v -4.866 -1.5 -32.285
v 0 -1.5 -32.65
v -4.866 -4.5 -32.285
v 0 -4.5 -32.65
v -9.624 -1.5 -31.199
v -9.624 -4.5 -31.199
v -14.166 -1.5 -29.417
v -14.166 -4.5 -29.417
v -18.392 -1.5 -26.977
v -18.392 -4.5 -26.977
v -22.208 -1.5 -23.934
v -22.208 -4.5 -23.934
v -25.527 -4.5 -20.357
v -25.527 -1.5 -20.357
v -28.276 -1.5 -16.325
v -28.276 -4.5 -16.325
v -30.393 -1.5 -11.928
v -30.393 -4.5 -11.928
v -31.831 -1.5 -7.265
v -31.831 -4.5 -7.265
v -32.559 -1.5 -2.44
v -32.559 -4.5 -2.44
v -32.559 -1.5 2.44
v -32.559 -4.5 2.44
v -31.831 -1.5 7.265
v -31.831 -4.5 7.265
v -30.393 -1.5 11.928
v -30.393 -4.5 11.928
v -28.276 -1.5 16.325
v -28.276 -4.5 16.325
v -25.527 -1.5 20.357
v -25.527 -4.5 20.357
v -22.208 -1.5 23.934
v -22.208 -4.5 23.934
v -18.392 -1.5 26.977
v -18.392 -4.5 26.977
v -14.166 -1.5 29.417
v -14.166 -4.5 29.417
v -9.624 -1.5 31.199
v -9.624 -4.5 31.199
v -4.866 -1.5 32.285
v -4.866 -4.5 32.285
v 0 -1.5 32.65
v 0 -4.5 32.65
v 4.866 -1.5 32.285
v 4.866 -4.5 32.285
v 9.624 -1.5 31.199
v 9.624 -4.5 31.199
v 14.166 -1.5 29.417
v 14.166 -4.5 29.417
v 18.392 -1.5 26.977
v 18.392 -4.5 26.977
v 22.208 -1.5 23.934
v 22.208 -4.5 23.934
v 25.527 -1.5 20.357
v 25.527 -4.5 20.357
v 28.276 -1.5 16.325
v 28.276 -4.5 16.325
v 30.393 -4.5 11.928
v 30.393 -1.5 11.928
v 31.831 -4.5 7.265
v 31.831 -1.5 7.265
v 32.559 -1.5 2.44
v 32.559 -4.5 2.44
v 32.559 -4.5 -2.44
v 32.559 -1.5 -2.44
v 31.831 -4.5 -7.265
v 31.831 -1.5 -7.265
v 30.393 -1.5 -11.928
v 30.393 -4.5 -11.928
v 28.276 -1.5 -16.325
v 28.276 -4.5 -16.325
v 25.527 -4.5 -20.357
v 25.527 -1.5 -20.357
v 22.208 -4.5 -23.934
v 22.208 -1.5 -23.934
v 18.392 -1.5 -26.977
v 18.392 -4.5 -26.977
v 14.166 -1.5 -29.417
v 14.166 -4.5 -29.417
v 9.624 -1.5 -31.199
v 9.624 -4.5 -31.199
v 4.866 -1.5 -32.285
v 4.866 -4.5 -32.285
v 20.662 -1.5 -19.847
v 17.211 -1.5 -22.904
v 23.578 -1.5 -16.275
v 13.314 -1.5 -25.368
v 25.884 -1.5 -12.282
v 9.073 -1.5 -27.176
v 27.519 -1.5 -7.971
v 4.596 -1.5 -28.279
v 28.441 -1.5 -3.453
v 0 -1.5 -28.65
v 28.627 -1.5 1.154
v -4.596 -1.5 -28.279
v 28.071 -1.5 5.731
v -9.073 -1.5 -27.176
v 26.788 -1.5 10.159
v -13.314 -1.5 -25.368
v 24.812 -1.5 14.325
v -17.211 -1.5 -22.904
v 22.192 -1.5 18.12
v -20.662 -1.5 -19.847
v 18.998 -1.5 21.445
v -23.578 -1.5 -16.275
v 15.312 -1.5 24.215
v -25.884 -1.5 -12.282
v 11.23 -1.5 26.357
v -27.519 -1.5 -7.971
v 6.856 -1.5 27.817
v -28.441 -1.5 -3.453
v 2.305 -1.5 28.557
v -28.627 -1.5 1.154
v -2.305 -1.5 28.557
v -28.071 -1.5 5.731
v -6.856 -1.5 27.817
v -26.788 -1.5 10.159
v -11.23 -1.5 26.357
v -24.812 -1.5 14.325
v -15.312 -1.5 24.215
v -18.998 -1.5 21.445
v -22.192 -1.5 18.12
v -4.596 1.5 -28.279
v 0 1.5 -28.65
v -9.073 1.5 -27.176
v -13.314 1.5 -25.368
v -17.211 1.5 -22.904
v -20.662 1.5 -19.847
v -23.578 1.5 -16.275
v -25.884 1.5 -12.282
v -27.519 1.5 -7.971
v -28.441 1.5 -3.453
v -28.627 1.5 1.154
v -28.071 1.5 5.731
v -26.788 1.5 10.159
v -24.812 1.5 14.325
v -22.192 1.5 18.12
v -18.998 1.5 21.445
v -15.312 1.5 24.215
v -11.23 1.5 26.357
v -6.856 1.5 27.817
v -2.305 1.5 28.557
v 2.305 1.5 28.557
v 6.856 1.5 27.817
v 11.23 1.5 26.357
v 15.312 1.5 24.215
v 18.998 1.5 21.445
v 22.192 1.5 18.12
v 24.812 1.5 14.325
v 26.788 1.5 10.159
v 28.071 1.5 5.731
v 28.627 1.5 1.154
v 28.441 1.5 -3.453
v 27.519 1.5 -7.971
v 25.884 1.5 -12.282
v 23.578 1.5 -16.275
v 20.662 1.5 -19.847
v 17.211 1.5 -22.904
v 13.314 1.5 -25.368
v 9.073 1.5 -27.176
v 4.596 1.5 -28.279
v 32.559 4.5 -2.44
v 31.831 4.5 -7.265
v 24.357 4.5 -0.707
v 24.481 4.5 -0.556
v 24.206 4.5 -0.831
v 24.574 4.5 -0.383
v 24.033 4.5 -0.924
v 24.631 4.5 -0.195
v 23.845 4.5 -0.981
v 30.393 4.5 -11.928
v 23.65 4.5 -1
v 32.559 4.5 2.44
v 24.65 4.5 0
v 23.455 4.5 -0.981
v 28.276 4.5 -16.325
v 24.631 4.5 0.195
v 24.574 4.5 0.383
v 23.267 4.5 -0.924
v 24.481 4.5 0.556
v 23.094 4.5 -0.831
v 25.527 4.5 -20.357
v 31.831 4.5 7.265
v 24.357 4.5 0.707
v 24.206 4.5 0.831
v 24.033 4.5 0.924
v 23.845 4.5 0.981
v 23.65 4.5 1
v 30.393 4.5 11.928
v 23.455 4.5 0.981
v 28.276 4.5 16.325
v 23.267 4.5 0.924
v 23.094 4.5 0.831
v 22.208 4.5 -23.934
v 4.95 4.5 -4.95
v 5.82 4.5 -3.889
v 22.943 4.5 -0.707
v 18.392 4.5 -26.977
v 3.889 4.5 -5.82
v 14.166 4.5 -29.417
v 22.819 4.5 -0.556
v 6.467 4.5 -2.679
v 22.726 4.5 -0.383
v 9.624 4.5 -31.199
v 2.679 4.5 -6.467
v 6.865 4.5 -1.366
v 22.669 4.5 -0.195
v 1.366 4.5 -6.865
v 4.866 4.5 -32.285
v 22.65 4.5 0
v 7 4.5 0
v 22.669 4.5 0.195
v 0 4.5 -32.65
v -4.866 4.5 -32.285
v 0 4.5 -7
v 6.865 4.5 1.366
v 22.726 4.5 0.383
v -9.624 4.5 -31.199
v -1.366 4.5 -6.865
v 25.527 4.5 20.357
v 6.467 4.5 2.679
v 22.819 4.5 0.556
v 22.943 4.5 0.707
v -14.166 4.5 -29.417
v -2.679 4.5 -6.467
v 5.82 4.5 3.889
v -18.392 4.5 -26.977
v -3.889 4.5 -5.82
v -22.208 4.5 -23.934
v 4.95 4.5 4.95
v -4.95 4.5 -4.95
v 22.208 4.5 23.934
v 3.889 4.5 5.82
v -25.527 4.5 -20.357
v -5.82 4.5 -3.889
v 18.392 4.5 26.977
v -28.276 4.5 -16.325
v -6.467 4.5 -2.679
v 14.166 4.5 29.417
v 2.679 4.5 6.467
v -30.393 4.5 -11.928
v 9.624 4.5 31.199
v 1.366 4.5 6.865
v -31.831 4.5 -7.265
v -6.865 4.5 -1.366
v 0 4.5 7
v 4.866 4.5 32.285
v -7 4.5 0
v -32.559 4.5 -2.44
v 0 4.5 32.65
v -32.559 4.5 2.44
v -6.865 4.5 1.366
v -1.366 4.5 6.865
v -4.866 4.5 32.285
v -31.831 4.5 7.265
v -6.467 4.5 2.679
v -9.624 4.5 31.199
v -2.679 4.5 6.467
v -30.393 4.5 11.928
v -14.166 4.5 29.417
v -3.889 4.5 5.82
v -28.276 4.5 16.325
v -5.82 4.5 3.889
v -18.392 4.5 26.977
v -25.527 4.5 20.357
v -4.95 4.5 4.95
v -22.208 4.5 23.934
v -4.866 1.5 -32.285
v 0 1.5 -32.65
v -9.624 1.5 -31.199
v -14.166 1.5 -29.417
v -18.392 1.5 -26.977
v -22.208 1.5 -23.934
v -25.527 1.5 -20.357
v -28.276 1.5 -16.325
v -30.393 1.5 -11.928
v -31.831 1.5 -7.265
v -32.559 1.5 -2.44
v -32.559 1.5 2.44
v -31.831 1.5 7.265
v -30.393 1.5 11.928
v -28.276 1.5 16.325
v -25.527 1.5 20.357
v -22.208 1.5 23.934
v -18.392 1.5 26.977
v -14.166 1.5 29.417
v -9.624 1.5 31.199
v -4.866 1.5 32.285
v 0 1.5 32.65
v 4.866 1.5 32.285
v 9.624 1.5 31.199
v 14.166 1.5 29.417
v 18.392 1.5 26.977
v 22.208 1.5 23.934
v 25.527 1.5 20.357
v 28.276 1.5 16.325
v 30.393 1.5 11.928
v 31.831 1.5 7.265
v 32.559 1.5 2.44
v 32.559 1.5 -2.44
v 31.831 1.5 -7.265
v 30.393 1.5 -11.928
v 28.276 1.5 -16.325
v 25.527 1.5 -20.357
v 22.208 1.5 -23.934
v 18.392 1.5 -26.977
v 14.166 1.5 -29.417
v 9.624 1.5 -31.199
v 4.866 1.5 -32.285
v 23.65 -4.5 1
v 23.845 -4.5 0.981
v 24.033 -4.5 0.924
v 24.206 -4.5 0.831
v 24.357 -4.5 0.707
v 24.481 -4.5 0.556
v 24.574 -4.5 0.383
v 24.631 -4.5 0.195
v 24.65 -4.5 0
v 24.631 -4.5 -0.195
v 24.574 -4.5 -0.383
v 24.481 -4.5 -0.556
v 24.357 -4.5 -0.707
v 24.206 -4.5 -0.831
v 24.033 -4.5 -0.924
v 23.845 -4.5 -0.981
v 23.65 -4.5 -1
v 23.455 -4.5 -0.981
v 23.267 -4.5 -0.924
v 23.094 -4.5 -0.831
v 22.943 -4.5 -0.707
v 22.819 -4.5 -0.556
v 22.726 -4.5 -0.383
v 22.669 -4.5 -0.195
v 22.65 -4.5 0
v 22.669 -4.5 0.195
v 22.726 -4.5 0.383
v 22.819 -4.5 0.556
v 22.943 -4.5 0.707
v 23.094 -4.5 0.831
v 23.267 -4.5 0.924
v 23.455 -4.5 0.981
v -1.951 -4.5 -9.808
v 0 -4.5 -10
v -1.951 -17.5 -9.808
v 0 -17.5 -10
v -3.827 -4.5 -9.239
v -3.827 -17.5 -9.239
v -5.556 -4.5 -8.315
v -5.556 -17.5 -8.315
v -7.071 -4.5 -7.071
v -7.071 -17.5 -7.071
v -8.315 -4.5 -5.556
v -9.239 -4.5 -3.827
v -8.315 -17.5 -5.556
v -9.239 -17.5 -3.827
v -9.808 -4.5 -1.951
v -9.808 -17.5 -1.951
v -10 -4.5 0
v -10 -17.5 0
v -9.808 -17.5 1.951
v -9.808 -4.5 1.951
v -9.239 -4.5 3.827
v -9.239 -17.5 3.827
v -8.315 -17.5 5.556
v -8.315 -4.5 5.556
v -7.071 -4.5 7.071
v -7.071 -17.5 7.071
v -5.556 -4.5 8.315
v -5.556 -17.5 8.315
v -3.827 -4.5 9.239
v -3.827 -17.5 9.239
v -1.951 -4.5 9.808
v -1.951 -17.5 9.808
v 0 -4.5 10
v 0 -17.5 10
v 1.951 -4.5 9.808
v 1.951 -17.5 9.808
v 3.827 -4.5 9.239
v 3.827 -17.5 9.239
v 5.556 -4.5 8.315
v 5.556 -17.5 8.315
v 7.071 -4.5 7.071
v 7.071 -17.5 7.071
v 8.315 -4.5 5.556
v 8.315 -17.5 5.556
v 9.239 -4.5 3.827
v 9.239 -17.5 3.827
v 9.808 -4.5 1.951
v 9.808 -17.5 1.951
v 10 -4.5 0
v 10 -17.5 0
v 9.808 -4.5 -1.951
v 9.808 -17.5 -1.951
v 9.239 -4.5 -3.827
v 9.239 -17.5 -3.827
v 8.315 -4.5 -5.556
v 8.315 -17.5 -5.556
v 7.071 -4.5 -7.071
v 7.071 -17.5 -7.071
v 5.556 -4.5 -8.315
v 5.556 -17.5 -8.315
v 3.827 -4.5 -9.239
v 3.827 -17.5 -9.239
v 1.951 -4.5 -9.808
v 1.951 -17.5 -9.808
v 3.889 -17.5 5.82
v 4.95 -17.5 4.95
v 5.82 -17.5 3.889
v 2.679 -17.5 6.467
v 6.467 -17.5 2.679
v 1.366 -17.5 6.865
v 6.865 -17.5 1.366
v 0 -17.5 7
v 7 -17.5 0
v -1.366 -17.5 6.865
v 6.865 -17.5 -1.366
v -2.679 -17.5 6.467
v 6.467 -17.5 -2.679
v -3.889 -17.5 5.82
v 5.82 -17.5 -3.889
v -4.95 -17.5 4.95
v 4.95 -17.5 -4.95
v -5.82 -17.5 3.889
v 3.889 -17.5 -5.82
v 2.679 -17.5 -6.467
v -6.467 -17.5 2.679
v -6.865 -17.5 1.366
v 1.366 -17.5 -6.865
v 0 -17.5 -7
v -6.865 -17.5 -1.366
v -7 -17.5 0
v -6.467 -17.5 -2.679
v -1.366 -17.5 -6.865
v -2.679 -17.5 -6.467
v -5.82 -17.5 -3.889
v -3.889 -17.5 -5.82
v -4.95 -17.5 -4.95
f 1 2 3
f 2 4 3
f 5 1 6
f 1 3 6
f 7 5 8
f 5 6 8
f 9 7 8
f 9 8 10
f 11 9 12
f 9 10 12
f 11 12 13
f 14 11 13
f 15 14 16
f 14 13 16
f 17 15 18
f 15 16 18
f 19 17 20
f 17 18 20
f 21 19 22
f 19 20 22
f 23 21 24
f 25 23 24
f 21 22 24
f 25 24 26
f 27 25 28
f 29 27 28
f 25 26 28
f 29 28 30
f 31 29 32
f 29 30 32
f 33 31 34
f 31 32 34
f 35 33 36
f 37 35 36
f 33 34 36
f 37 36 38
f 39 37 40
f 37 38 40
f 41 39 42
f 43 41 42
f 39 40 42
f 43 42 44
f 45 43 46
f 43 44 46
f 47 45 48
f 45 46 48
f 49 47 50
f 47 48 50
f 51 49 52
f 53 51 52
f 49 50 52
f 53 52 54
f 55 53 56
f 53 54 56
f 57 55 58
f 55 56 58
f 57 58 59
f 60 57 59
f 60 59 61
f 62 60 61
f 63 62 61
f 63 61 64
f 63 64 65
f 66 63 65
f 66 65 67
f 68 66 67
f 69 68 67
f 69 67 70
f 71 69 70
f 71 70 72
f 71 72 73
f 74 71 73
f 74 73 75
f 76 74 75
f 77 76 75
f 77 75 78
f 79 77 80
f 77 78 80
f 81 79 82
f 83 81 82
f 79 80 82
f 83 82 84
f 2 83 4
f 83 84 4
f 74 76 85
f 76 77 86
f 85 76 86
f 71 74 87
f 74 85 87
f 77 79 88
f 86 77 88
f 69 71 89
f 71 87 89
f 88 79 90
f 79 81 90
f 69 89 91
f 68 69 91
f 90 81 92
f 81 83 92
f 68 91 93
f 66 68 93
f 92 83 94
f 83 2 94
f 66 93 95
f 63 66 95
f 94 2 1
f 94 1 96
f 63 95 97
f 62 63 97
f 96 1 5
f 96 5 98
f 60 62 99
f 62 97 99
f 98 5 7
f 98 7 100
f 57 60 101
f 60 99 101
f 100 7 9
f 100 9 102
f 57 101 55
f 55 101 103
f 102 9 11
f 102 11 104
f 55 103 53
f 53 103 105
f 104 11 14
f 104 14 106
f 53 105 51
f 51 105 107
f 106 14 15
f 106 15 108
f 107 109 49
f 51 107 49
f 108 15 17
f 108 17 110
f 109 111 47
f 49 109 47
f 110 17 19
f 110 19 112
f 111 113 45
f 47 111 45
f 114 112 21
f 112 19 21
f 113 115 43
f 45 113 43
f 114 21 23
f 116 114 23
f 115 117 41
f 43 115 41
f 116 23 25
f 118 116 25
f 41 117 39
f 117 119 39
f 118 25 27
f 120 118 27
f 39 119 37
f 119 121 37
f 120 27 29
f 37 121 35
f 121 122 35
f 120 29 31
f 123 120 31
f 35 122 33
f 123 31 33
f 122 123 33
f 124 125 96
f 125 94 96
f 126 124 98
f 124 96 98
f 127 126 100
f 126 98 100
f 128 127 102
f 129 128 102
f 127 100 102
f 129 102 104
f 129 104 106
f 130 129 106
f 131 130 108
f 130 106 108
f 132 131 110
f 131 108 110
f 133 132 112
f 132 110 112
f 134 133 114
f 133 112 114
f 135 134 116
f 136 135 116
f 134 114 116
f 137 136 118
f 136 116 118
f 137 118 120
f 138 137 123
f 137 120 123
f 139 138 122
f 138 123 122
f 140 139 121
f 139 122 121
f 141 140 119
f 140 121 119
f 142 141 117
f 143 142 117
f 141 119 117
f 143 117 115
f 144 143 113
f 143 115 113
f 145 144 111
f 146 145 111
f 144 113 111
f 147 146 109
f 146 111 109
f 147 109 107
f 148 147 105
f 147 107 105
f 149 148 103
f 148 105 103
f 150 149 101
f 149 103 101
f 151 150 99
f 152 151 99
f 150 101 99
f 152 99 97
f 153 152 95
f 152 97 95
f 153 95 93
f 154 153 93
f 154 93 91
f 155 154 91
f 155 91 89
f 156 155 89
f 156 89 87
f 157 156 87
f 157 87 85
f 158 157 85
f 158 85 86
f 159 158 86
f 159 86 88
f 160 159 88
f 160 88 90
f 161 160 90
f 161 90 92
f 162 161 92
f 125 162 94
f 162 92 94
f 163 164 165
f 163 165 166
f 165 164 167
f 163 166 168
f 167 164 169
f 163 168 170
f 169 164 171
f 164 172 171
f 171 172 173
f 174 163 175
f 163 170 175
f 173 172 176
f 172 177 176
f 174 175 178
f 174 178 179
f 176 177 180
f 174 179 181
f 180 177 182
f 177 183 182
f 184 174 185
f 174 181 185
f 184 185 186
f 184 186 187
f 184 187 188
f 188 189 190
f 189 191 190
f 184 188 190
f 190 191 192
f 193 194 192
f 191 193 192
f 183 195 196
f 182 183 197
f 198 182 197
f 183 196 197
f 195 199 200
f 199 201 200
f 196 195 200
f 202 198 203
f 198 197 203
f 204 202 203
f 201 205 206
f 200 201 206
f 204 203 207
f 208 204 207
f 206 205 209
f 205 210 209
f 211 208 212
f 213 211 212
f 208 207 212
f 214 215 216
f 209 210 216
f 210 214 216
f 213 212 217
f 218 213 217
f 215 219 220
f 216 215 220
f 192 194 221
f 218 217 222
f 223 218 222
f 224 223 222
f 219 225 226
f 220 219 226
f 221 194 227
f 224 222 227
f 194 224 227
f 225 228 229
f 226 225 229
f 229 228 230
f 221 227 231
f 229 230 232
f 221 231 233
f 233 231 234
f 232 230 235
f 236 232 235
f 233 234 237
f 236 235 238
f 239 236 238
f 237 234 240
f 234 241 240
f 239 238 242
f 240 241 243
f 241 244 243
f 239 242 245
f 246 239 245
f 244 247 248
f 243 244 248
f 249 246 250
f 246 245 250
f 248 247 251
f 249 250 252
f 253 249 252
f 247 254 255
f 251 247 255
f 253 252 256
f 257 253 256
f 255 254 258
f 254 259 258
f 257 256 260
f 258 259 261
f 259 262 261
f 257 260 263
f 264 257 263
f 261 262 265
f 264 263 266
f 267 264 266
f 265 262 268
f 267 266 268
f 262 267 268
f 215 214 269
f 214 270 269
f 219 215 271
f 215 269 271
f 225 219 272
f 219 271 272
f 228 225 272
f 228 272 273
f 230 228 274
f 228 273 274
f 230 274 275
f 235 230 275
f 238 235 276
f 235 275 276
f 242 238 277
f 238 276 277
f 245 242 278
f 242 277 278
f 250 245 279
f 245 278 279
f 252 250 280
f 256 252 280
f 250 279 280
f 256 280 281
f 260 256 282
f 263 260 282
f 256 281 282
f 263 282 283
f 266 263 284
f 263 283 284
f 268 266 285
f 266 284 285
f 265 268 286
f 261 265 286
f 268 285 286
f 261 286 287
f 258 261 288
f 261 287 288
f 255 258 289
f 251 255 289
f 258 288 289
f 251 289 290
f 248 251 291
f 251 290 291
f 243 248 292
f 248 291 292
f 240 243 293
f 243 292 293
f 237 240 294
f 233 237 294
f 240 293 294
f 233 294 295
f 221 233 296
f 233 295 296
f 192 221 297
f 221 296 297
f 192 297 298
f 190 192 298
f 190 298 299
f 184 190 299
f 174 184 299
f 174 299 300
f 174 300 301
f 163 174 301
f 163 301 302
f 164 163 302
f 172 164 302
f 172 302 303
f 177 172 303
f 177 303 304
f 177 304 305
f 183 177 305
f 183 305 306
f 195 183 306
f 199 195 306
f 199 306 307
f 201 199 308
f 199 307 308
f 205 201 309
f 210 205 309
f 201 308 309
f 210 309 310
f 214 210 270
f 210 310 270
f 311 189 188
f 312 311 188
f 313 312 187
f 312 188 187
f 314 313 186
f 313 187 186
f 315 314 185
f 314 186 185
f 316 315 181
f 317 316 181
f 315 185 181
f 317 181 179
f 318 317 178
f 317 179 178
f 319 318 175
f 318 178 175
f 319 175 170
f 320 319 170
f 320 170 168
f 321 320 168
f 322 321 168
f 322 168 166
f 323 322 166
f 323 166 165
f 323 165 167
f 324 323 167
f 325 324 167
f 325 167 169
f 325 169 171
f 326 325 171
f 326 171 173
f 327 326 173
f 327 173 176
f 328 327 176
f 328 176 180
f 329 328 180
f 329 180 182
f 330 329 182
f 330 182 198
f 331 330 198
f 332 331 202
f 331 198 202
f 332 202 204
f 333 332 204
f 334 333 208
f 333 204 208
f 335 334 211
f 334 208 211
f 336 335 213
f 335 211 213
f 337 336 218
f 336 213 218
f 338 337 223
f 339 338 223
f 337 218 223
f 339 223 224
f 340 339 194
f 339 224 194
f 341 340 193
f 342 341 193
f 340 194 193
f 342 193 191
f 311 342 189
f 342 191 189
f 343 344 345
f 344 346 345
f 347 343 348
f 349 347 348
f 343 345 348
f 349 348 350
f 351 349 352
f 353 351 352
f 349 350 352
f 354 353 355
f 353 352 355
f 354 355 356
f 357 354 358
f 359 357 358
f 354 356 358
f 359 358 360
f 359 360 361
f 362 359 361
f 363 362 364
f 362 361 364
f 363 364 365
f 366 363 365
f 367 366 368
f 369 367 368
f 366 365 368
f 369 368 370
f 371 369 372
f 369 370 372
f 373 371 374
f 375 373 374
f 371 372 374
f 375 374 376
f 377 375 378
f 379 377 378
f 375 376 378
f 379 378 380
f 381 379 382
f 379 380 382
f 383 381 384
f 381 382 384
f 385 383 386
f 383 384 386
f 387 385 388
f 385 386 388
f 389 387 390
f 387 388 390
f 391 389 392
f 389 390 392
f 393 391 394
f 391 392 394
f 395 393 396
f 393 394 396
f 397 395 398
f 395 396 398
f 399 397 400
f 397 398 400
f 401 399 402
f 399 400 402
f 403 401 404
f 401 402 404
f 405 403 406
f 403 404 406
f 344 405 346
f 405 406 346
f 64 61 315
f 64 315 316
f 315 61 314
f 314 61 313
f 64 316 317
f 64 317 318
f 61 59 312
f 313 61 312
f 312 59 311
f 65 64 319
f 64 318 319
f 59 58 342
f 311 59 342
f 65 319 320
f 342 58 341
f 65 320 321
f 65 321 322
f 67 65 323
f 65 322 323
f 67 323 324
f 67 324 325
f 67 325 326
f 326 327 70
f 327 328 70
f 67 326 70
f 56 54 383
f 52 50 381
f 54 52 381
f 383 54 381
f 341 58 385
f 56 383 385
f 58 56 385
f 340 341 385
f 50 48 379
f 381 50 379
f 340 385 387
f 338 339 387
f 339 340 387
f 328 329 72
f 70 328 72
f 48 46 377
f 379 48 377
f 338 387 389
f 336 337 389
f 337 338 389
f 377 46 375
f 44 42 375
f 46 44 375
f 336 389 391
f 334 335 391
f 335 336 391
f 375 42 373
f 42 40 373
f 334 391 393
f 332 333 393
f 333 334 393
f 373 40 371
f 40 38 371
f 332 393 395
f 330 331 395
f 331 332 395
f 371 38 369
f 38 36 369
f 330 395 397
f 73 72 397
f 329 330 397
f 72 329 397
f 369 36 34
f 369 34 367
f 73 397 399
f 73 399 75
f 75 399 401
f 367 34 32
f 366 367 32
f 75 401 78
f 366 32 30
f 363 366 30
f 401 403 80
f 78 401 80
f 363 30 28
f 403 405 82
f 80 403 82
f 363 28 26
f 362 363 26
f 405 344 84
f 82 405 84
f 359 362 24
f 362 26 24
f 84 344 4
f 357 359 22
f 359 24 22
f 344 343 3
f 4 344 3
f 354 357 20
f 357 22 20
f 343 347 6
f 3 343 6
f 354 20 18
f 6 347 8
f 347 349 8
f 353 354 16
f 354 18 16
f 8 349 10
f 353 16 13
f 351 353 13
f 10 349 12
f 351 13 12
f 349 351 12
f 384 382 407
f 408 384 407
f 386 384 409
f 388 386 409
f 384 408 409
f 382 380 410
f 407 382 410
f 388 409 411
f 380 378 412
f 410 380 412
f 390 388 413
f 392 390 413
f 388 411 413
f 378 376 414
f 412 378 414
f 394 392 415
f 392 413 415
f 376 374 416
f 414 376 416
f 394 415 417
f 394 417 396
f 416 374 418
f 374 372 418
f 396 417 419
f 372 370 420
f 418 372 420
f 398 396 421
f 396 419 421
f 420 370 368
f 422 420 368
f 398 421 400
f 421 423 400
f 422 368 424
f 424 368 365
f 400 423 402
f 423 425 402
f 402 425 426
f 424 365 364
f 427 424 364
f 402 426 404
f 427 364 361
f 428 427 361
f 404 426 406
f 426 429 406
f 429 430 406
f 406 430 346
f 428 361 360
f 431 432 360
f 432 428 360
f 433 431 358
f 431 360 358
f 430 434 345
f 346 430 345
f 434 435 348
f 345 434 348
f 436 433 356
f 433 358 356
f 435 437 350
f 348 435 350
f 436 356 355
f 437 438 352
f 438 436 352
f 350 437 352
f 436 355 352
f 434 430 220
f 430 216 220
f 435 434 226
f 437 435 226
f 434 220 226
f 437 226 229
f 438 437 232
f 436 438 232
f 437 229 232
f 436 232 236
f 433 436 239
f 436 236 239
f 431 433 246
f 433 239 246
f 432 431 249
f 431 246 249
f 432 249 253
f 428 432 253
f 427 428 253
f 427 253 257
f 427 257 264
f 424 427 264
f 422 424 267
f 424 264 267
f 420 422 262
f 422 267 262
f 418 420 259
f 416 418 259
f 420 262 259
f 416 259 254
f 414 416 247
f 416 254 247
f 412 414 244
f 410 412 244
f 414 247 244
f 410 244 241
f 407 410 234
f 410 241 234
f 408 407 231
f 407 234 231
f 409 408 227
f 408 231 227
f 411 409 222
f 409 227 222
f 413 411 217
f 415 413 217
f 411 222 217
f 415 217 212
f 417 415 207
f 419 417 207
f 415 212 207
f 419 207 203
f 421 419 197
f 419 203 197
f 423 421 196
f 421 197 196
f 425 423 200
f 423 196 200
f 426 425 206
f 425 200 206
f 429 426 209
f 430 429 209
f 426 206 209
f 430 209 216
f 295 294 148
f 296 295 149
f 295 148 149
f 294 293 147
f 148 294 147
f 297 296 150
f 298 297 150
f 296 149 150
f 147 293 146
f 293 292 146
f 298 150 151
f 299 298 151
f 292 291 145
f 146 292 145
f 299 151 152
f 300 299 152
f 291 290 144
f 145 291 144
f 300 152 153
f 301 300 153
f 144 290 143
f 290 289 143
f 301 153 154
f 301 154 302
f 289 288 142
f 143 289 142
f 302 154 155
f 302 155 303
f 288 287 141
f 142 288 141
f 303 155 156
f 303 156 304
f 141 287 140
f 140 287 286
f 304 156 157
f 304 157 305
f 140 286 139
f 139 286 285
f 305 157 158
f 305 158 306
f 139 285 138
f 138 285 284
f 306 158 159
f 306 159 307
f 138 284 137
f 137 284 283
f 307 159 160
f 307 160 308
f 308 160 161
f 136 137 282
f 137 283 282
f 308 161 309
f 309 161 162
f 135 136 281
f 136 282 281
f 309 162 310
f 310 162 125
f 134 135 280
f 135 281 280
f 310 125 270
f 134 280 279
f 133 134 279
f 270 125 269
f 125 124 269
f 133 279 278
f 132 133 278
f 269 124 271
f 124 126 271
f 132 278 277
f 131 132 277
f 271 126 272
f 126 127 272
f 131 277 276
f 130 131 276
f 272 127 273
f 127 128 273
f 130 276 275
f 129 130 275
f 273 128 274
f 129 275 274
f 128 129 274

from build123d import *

# Parameters (mm, degrees)
SKETCH2_R          = 1
CUT_EXTRUDE1_DEPTH = 52.147287318


with BuildPart() as part:
    # Sketch1 → Revolve1 (revolve)
    with BuildSketch(Plane.XY, mode=Mode.PRIVATE) as revolve1_sk:
        Polygon((32.65, -4.5), (10, -4.5), (10, -17.5), (7, -17.5), (7, 4.5), (32.65, 4.5), (32.65, 1.5), (28.65, 1.5), (28.65, -1.5), (32.65, -1.5), align=None)
    revolve(revolve1_sk.sketch.rotate(Axis((0, 0, 0), (0, 1, 0)), 90), axis=Axis((0, 0, 0), (0, 1, 0)))

    # Sketch2 → Cut-Extrude1 (cut, through all)
    with BuildSketch(Plane(origin=(0, 4.5, 0), x_dir=(1, 0, 0), z_dir=(0, 1, 0))):
        with Locations(Location((23.65, 0, 0), (0, 0, 270))):
            Circle(SKETCH2_R)
    extrude(amount=-CUT_EXTRUDE1_DEPTH, mode=Mode.SUBTRACT)


solid = part.part
